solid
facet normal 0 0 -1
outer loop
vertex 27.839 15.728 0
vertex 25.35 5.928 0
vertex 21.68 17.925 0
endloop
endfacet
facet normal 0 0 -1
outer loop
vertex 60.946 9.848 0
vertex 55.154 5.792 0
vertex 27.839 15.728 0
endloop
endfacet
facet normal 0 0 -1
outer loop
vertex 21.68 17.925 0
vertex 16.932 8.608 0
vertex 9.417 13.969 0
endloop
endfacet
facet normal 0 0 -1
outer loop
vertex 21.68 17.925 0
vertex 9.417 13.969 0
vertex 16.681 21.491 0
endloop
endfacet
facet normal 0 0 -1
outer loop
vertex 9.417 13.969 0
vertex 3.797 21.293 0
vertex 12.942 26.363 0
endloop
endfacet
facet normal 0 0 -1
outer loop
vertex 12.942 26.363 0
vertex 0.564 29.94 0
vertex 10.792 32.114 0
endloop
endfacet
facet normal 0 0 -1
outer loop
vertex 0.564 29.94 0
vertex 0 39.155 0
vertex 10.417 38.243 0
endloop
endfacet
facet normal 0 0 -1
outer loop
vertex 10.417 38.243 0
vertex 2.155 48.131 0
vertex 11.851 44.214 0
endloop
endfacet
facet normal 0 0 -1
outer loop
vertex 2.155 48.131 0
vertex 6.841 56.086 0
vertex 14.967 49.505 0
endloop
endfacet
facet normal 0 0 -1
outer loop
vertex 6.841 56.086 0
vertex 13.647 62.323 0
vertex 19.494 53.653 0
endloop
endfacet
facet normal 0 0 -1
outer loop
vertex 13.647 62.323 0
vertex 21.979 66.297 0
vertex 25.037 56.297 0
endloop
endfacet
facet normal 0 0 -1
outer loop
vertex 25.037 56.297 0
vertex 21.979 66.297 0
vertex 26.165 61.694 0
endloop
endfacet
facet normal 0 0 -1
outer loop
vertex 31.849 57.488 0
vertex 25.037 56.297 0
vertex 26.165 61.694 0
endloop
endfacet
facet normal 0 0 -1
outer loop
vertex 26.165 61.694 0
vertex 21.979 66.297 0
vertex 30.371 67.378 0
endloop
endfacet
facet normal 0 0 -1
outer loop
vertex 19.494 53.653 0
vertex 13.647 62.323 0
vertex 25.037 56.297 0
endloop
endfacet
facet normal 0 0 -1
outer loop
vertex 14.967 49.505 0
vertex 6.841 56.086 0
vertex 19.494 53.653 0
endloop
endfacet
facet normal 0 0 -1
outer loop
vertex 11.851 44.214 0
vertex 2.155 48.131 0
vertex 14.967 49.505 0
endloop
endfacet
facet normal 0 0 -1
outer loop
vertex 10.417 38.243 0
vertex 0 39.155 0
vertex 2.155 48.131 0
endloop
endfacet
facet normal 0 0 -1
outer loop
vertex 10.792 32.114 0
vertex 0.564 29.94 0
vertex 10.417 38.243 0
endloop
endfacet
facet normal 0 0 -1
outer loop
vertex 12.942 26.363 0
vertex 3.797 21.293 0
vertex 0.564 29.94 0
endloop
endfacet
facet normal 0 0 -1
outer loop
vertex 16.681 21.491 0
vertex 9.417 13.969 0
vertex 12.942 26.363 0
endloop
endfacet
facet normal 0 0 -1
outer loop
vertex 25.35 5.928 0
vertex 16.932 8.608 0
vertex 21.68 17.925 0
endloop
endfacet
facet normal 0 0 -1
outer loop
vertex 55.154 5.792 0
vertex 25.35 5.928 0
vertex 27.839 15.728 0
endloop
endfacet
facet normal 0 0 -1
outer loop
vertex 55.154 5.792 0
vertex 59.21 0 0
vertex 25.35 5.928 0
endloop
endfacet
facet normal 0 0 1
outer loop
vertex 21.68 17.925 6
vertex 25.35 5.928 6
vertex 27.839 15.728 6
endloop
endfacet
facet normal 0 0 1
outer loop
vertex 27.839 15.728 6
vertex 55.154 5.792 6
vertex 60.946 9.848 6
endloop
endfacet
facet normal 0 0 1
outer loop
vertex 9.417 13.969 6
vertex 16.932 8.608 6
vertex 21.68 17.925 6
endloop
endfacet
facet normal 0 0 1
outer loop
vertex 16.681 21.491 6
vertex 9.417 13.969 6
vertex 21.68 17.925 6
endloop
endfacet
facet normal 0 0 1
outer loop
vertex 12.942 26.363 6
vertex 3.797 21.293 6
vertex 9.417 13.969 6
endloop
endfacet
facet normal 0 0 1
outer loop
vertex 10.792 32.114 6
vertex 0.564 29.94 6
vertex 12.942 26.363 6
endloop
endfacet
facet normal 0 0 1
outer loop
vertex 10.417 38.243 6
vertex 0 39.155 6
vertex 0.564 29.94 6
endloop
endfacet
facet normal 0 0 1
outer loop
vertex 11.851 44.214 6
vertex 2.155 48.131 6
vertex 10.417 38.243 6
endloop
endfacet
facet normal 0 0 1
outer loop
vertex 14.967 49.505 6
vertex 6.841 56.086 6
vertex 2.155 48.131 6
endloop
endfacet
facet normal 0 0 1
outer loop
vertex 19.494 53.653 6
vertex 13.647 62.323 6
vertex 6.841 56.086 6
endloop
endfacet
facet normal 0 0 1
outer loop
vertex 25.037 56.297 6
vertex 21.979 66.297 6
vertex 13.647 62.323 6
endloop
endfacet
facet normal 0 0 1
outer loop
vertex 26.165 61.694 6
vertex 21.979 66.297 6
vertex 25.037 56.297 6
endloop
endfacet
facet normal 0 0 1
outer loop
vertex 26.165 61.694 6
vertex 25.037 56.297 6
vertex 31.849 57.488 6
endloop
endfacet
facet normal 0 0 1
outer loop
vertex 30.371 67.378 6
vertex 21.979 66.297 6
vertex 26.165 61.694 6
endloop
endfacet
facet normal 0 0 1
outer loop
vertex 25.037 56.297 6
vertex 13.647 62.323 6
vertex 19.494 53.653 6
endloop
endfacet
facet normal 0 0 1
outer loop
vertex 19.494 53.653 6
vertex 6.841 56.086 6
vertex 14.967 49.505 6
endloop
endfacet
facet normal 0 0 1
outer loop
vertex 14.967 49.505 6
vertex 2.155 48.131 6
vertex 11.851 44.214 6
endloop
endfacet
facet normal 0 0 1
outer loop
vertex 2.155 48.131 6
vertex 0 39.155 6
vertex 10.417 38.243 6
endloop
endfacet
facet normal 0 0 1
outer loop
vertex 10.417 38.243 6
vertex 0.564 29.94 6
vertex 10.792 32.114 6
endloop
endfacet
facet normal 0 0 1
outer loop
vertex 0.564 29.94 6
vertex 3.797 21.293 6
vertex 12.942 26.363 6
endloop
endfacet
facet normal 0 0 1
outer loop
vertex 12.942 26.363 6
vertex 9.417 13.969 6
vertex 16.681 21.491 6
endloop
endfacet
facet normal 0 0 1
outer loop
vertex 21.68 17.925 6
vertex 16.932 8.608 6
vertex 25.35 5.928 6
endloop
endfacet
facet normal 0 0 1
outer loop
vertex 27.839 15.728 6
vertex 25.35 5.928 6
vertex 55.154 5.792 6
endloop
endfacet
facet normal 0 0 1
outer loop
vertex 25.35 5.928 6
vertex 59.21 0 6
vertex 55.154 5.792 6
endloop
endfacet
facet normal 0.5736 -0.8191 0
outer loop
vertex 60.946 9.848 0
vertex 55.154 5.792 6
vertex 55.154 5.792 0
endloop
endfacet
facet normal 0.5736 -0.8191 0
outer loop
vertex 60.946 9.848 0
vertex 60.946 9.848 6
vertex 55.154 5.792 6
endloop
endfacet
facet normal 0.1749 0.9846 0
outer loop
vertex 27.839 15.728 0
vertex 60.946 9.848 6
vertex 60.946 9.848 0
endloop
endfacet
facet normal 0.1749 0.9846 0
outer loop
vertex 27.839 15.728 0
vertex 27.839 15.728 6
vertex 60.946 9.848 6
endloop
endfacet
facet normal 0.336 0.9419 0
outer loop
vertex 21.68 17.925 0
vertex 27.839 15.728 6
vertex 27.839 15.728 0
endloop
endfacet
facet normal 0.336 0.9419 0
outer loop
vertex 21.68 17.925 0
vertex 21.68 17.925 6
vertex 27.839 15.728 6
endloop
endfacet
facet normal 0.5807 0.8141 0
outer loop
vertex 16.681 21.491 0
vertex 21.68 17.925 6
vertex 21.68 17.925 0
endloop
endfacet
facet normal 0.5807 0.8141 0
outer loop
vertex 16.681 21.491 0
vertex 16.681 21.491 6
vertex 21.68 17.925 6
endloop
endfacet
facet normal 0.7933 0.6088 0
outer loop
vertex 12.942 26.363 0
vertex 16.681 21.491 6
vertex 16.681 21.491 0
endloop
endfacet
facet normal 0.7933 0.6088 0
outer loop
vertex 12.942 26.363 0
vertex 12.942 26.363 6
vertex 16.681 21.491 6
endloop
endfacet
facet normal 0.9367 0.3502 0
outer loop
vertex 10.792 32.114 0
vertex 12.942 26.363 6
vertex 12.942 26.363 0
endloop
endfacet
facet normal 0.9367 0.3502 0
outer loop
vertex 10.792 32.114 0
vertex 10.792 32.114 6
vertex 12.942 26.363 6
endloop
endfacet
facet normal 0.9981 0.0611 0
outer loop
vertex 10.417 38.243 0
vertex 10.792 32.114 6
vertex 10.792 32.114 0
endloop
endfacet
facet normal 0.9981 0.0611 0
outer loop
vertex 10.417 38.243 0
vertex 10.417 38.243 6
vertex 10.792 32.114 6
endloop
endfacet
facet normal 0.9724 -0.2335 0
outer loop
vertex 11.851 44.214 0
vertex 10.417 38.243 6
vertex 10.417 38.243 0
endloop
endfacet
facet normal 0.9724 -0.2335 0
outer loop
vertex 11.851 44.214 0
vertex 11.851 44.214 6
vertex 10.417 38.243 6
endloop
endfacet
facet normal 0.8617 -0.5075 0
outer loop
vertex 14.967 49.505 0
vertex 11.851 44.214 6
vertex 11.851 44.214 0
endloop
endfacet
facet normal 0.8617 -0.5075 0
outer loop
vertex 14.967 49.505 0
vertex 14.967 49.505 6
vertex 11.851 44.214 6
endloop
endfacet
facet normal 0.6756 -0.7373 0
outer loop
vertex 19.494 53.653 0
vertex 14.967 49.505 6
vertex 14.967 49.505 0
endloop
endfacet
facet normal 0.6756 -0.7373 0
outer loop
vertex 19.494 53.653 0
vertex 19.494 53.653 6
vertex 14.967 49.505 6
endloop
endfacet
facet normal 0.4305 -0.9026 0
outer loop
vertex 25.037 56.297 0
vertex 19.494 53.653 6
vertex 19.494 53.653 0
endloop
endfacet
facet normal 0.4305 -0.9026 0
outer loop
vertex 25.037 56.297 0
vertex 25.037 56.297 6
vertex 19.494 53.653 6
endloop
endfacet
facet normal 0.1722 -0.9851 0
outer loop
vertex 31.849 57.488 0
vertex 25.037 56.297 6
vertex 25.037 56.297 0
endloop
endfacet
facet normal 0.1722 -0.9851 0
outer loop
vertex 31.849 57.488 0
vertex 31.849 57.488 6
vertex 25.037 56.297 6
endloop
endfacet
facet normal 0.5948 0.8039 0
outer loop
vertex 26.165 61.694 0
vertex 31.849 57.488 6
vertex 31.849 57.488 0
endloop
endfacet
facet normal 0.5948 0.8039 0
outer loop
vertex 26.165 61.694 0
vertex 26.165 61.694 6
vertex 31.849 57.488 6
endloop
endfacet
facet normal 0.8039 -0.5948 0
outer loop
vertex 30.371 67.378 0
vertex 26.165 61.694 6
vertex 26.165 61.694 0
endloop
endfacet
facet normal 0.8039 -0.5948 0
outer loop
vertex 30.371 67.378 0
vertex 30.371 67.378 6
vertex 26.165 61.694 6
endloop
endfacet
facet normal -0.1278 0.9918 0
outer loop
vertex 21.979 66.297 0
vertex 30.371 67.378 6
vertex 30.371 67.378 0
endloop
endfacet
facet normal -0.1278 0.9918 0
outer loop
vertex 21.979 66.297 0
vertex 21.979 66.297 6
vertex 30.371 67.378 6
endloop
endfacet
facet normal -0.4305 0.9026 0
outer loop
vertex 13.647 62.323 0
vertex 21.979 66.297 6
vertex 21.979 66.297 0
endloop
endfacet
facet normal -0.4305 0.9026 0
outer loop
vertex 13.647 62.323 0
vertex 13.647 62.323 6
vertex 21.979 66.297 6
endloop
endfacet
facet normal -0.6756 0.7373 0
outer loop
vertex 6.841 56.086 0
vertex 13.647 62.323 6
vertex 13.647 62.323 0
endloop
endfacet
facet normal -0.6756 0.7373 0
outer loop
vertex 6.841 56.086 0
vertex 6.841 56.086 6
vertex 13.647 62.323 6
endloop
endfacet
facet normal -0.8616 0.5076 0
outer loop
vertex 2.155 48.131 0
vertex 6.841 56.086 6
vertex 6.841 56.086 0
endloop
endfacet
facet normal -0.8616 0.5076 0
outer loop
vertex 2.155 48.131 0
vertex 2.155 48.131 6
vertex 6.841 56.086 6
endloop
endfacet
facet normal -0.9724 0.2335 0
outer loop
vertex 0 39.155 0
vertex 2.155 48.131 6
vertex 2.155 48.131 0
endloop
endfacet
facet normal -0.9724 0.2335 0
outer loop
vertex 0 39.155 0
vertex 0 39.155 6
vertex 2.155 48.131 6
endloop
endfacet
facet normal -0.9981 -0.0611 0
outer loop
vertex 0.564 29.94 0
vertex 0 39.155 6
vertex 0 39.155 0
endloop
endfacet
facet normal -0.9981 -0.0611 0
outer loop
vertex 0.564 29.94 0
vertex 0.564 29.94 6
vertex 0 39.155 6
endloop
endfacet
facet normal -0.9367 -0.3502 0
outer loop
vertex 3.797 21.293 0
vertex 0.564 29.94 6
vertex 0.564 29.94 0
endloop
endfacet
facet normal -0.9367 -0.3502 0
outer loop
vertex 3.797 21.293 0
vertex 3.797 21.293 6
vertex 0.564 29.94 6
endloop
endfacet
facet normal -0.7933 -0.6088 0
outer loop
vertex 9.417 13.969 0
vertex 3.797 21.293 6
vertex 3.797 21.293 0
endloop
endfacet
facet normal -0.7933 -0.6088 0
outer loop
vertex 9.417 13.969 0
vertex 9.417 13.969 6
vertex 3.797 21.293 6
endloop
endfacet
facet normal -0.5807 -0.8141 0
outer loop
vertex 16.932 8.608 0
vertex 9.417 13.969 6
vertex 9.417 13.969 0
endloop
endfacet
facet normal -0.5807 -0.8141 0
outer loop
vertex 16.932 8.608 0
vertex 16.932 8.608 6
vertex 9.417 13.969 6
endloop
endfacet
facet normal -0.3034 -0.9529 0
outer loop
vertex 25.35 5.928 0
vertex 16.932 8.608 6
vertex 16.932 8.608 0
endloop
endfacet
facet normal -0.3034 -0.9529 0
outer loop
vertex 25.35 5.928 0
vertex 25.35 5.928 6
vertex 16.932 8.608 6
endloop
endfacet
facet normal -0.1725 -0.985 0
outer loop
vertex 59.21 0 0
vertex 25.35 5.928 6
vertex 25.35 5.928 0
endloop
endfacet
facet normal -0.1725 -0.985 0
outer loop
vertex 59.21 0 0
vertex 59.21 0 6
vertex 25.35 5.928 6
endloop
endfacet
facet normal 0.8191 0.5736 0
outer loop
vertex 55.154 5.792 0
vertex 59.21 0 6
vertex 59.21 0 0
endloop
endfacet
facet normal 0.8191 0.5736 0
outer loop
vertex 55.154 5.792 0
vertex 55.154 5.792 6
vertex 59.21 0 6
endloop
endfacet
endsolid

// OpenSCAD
$fn = 32;

// ----------------------------------------------------------------------
// Hook plate: curl radius 26 mm over 170 degrees, 10 mm thick band
// ----------------------------------------------------------------------

// --- parameters (mm) ---
profile_height = 6;       // extrusion height
profile_points = 26;      // points of the closed outline

profile = [[26.165, 61.694], [30.371, 67.378], [21.979, 66.297], [13.647, 62.323], [6.841, 56.086], [2.155, 48.131], [0, 39.155], [0.564, 29.94], [3.797, 21.293], [9.417, 13.969], [16.932, 8.608], [25.35, 5.928], [59.21, 0], [55.154, 5.792], [60.946, 9.848], [27.839, 15.728], [21.68, 17.925], [16.681, 21.491], [12.942, 26.363], [10.792, 32.114], [10.417, 38.243], [11.851, 44.214], [14.967, 49.505], [19.494, 53.653], [25.037, 56.297], [31.849, 57.488]];  // single closed polygon, 26 points, counter clockwise

// --- the one profile operation ---
linear_extrude(height = profile_height) polygon(points = profile);
